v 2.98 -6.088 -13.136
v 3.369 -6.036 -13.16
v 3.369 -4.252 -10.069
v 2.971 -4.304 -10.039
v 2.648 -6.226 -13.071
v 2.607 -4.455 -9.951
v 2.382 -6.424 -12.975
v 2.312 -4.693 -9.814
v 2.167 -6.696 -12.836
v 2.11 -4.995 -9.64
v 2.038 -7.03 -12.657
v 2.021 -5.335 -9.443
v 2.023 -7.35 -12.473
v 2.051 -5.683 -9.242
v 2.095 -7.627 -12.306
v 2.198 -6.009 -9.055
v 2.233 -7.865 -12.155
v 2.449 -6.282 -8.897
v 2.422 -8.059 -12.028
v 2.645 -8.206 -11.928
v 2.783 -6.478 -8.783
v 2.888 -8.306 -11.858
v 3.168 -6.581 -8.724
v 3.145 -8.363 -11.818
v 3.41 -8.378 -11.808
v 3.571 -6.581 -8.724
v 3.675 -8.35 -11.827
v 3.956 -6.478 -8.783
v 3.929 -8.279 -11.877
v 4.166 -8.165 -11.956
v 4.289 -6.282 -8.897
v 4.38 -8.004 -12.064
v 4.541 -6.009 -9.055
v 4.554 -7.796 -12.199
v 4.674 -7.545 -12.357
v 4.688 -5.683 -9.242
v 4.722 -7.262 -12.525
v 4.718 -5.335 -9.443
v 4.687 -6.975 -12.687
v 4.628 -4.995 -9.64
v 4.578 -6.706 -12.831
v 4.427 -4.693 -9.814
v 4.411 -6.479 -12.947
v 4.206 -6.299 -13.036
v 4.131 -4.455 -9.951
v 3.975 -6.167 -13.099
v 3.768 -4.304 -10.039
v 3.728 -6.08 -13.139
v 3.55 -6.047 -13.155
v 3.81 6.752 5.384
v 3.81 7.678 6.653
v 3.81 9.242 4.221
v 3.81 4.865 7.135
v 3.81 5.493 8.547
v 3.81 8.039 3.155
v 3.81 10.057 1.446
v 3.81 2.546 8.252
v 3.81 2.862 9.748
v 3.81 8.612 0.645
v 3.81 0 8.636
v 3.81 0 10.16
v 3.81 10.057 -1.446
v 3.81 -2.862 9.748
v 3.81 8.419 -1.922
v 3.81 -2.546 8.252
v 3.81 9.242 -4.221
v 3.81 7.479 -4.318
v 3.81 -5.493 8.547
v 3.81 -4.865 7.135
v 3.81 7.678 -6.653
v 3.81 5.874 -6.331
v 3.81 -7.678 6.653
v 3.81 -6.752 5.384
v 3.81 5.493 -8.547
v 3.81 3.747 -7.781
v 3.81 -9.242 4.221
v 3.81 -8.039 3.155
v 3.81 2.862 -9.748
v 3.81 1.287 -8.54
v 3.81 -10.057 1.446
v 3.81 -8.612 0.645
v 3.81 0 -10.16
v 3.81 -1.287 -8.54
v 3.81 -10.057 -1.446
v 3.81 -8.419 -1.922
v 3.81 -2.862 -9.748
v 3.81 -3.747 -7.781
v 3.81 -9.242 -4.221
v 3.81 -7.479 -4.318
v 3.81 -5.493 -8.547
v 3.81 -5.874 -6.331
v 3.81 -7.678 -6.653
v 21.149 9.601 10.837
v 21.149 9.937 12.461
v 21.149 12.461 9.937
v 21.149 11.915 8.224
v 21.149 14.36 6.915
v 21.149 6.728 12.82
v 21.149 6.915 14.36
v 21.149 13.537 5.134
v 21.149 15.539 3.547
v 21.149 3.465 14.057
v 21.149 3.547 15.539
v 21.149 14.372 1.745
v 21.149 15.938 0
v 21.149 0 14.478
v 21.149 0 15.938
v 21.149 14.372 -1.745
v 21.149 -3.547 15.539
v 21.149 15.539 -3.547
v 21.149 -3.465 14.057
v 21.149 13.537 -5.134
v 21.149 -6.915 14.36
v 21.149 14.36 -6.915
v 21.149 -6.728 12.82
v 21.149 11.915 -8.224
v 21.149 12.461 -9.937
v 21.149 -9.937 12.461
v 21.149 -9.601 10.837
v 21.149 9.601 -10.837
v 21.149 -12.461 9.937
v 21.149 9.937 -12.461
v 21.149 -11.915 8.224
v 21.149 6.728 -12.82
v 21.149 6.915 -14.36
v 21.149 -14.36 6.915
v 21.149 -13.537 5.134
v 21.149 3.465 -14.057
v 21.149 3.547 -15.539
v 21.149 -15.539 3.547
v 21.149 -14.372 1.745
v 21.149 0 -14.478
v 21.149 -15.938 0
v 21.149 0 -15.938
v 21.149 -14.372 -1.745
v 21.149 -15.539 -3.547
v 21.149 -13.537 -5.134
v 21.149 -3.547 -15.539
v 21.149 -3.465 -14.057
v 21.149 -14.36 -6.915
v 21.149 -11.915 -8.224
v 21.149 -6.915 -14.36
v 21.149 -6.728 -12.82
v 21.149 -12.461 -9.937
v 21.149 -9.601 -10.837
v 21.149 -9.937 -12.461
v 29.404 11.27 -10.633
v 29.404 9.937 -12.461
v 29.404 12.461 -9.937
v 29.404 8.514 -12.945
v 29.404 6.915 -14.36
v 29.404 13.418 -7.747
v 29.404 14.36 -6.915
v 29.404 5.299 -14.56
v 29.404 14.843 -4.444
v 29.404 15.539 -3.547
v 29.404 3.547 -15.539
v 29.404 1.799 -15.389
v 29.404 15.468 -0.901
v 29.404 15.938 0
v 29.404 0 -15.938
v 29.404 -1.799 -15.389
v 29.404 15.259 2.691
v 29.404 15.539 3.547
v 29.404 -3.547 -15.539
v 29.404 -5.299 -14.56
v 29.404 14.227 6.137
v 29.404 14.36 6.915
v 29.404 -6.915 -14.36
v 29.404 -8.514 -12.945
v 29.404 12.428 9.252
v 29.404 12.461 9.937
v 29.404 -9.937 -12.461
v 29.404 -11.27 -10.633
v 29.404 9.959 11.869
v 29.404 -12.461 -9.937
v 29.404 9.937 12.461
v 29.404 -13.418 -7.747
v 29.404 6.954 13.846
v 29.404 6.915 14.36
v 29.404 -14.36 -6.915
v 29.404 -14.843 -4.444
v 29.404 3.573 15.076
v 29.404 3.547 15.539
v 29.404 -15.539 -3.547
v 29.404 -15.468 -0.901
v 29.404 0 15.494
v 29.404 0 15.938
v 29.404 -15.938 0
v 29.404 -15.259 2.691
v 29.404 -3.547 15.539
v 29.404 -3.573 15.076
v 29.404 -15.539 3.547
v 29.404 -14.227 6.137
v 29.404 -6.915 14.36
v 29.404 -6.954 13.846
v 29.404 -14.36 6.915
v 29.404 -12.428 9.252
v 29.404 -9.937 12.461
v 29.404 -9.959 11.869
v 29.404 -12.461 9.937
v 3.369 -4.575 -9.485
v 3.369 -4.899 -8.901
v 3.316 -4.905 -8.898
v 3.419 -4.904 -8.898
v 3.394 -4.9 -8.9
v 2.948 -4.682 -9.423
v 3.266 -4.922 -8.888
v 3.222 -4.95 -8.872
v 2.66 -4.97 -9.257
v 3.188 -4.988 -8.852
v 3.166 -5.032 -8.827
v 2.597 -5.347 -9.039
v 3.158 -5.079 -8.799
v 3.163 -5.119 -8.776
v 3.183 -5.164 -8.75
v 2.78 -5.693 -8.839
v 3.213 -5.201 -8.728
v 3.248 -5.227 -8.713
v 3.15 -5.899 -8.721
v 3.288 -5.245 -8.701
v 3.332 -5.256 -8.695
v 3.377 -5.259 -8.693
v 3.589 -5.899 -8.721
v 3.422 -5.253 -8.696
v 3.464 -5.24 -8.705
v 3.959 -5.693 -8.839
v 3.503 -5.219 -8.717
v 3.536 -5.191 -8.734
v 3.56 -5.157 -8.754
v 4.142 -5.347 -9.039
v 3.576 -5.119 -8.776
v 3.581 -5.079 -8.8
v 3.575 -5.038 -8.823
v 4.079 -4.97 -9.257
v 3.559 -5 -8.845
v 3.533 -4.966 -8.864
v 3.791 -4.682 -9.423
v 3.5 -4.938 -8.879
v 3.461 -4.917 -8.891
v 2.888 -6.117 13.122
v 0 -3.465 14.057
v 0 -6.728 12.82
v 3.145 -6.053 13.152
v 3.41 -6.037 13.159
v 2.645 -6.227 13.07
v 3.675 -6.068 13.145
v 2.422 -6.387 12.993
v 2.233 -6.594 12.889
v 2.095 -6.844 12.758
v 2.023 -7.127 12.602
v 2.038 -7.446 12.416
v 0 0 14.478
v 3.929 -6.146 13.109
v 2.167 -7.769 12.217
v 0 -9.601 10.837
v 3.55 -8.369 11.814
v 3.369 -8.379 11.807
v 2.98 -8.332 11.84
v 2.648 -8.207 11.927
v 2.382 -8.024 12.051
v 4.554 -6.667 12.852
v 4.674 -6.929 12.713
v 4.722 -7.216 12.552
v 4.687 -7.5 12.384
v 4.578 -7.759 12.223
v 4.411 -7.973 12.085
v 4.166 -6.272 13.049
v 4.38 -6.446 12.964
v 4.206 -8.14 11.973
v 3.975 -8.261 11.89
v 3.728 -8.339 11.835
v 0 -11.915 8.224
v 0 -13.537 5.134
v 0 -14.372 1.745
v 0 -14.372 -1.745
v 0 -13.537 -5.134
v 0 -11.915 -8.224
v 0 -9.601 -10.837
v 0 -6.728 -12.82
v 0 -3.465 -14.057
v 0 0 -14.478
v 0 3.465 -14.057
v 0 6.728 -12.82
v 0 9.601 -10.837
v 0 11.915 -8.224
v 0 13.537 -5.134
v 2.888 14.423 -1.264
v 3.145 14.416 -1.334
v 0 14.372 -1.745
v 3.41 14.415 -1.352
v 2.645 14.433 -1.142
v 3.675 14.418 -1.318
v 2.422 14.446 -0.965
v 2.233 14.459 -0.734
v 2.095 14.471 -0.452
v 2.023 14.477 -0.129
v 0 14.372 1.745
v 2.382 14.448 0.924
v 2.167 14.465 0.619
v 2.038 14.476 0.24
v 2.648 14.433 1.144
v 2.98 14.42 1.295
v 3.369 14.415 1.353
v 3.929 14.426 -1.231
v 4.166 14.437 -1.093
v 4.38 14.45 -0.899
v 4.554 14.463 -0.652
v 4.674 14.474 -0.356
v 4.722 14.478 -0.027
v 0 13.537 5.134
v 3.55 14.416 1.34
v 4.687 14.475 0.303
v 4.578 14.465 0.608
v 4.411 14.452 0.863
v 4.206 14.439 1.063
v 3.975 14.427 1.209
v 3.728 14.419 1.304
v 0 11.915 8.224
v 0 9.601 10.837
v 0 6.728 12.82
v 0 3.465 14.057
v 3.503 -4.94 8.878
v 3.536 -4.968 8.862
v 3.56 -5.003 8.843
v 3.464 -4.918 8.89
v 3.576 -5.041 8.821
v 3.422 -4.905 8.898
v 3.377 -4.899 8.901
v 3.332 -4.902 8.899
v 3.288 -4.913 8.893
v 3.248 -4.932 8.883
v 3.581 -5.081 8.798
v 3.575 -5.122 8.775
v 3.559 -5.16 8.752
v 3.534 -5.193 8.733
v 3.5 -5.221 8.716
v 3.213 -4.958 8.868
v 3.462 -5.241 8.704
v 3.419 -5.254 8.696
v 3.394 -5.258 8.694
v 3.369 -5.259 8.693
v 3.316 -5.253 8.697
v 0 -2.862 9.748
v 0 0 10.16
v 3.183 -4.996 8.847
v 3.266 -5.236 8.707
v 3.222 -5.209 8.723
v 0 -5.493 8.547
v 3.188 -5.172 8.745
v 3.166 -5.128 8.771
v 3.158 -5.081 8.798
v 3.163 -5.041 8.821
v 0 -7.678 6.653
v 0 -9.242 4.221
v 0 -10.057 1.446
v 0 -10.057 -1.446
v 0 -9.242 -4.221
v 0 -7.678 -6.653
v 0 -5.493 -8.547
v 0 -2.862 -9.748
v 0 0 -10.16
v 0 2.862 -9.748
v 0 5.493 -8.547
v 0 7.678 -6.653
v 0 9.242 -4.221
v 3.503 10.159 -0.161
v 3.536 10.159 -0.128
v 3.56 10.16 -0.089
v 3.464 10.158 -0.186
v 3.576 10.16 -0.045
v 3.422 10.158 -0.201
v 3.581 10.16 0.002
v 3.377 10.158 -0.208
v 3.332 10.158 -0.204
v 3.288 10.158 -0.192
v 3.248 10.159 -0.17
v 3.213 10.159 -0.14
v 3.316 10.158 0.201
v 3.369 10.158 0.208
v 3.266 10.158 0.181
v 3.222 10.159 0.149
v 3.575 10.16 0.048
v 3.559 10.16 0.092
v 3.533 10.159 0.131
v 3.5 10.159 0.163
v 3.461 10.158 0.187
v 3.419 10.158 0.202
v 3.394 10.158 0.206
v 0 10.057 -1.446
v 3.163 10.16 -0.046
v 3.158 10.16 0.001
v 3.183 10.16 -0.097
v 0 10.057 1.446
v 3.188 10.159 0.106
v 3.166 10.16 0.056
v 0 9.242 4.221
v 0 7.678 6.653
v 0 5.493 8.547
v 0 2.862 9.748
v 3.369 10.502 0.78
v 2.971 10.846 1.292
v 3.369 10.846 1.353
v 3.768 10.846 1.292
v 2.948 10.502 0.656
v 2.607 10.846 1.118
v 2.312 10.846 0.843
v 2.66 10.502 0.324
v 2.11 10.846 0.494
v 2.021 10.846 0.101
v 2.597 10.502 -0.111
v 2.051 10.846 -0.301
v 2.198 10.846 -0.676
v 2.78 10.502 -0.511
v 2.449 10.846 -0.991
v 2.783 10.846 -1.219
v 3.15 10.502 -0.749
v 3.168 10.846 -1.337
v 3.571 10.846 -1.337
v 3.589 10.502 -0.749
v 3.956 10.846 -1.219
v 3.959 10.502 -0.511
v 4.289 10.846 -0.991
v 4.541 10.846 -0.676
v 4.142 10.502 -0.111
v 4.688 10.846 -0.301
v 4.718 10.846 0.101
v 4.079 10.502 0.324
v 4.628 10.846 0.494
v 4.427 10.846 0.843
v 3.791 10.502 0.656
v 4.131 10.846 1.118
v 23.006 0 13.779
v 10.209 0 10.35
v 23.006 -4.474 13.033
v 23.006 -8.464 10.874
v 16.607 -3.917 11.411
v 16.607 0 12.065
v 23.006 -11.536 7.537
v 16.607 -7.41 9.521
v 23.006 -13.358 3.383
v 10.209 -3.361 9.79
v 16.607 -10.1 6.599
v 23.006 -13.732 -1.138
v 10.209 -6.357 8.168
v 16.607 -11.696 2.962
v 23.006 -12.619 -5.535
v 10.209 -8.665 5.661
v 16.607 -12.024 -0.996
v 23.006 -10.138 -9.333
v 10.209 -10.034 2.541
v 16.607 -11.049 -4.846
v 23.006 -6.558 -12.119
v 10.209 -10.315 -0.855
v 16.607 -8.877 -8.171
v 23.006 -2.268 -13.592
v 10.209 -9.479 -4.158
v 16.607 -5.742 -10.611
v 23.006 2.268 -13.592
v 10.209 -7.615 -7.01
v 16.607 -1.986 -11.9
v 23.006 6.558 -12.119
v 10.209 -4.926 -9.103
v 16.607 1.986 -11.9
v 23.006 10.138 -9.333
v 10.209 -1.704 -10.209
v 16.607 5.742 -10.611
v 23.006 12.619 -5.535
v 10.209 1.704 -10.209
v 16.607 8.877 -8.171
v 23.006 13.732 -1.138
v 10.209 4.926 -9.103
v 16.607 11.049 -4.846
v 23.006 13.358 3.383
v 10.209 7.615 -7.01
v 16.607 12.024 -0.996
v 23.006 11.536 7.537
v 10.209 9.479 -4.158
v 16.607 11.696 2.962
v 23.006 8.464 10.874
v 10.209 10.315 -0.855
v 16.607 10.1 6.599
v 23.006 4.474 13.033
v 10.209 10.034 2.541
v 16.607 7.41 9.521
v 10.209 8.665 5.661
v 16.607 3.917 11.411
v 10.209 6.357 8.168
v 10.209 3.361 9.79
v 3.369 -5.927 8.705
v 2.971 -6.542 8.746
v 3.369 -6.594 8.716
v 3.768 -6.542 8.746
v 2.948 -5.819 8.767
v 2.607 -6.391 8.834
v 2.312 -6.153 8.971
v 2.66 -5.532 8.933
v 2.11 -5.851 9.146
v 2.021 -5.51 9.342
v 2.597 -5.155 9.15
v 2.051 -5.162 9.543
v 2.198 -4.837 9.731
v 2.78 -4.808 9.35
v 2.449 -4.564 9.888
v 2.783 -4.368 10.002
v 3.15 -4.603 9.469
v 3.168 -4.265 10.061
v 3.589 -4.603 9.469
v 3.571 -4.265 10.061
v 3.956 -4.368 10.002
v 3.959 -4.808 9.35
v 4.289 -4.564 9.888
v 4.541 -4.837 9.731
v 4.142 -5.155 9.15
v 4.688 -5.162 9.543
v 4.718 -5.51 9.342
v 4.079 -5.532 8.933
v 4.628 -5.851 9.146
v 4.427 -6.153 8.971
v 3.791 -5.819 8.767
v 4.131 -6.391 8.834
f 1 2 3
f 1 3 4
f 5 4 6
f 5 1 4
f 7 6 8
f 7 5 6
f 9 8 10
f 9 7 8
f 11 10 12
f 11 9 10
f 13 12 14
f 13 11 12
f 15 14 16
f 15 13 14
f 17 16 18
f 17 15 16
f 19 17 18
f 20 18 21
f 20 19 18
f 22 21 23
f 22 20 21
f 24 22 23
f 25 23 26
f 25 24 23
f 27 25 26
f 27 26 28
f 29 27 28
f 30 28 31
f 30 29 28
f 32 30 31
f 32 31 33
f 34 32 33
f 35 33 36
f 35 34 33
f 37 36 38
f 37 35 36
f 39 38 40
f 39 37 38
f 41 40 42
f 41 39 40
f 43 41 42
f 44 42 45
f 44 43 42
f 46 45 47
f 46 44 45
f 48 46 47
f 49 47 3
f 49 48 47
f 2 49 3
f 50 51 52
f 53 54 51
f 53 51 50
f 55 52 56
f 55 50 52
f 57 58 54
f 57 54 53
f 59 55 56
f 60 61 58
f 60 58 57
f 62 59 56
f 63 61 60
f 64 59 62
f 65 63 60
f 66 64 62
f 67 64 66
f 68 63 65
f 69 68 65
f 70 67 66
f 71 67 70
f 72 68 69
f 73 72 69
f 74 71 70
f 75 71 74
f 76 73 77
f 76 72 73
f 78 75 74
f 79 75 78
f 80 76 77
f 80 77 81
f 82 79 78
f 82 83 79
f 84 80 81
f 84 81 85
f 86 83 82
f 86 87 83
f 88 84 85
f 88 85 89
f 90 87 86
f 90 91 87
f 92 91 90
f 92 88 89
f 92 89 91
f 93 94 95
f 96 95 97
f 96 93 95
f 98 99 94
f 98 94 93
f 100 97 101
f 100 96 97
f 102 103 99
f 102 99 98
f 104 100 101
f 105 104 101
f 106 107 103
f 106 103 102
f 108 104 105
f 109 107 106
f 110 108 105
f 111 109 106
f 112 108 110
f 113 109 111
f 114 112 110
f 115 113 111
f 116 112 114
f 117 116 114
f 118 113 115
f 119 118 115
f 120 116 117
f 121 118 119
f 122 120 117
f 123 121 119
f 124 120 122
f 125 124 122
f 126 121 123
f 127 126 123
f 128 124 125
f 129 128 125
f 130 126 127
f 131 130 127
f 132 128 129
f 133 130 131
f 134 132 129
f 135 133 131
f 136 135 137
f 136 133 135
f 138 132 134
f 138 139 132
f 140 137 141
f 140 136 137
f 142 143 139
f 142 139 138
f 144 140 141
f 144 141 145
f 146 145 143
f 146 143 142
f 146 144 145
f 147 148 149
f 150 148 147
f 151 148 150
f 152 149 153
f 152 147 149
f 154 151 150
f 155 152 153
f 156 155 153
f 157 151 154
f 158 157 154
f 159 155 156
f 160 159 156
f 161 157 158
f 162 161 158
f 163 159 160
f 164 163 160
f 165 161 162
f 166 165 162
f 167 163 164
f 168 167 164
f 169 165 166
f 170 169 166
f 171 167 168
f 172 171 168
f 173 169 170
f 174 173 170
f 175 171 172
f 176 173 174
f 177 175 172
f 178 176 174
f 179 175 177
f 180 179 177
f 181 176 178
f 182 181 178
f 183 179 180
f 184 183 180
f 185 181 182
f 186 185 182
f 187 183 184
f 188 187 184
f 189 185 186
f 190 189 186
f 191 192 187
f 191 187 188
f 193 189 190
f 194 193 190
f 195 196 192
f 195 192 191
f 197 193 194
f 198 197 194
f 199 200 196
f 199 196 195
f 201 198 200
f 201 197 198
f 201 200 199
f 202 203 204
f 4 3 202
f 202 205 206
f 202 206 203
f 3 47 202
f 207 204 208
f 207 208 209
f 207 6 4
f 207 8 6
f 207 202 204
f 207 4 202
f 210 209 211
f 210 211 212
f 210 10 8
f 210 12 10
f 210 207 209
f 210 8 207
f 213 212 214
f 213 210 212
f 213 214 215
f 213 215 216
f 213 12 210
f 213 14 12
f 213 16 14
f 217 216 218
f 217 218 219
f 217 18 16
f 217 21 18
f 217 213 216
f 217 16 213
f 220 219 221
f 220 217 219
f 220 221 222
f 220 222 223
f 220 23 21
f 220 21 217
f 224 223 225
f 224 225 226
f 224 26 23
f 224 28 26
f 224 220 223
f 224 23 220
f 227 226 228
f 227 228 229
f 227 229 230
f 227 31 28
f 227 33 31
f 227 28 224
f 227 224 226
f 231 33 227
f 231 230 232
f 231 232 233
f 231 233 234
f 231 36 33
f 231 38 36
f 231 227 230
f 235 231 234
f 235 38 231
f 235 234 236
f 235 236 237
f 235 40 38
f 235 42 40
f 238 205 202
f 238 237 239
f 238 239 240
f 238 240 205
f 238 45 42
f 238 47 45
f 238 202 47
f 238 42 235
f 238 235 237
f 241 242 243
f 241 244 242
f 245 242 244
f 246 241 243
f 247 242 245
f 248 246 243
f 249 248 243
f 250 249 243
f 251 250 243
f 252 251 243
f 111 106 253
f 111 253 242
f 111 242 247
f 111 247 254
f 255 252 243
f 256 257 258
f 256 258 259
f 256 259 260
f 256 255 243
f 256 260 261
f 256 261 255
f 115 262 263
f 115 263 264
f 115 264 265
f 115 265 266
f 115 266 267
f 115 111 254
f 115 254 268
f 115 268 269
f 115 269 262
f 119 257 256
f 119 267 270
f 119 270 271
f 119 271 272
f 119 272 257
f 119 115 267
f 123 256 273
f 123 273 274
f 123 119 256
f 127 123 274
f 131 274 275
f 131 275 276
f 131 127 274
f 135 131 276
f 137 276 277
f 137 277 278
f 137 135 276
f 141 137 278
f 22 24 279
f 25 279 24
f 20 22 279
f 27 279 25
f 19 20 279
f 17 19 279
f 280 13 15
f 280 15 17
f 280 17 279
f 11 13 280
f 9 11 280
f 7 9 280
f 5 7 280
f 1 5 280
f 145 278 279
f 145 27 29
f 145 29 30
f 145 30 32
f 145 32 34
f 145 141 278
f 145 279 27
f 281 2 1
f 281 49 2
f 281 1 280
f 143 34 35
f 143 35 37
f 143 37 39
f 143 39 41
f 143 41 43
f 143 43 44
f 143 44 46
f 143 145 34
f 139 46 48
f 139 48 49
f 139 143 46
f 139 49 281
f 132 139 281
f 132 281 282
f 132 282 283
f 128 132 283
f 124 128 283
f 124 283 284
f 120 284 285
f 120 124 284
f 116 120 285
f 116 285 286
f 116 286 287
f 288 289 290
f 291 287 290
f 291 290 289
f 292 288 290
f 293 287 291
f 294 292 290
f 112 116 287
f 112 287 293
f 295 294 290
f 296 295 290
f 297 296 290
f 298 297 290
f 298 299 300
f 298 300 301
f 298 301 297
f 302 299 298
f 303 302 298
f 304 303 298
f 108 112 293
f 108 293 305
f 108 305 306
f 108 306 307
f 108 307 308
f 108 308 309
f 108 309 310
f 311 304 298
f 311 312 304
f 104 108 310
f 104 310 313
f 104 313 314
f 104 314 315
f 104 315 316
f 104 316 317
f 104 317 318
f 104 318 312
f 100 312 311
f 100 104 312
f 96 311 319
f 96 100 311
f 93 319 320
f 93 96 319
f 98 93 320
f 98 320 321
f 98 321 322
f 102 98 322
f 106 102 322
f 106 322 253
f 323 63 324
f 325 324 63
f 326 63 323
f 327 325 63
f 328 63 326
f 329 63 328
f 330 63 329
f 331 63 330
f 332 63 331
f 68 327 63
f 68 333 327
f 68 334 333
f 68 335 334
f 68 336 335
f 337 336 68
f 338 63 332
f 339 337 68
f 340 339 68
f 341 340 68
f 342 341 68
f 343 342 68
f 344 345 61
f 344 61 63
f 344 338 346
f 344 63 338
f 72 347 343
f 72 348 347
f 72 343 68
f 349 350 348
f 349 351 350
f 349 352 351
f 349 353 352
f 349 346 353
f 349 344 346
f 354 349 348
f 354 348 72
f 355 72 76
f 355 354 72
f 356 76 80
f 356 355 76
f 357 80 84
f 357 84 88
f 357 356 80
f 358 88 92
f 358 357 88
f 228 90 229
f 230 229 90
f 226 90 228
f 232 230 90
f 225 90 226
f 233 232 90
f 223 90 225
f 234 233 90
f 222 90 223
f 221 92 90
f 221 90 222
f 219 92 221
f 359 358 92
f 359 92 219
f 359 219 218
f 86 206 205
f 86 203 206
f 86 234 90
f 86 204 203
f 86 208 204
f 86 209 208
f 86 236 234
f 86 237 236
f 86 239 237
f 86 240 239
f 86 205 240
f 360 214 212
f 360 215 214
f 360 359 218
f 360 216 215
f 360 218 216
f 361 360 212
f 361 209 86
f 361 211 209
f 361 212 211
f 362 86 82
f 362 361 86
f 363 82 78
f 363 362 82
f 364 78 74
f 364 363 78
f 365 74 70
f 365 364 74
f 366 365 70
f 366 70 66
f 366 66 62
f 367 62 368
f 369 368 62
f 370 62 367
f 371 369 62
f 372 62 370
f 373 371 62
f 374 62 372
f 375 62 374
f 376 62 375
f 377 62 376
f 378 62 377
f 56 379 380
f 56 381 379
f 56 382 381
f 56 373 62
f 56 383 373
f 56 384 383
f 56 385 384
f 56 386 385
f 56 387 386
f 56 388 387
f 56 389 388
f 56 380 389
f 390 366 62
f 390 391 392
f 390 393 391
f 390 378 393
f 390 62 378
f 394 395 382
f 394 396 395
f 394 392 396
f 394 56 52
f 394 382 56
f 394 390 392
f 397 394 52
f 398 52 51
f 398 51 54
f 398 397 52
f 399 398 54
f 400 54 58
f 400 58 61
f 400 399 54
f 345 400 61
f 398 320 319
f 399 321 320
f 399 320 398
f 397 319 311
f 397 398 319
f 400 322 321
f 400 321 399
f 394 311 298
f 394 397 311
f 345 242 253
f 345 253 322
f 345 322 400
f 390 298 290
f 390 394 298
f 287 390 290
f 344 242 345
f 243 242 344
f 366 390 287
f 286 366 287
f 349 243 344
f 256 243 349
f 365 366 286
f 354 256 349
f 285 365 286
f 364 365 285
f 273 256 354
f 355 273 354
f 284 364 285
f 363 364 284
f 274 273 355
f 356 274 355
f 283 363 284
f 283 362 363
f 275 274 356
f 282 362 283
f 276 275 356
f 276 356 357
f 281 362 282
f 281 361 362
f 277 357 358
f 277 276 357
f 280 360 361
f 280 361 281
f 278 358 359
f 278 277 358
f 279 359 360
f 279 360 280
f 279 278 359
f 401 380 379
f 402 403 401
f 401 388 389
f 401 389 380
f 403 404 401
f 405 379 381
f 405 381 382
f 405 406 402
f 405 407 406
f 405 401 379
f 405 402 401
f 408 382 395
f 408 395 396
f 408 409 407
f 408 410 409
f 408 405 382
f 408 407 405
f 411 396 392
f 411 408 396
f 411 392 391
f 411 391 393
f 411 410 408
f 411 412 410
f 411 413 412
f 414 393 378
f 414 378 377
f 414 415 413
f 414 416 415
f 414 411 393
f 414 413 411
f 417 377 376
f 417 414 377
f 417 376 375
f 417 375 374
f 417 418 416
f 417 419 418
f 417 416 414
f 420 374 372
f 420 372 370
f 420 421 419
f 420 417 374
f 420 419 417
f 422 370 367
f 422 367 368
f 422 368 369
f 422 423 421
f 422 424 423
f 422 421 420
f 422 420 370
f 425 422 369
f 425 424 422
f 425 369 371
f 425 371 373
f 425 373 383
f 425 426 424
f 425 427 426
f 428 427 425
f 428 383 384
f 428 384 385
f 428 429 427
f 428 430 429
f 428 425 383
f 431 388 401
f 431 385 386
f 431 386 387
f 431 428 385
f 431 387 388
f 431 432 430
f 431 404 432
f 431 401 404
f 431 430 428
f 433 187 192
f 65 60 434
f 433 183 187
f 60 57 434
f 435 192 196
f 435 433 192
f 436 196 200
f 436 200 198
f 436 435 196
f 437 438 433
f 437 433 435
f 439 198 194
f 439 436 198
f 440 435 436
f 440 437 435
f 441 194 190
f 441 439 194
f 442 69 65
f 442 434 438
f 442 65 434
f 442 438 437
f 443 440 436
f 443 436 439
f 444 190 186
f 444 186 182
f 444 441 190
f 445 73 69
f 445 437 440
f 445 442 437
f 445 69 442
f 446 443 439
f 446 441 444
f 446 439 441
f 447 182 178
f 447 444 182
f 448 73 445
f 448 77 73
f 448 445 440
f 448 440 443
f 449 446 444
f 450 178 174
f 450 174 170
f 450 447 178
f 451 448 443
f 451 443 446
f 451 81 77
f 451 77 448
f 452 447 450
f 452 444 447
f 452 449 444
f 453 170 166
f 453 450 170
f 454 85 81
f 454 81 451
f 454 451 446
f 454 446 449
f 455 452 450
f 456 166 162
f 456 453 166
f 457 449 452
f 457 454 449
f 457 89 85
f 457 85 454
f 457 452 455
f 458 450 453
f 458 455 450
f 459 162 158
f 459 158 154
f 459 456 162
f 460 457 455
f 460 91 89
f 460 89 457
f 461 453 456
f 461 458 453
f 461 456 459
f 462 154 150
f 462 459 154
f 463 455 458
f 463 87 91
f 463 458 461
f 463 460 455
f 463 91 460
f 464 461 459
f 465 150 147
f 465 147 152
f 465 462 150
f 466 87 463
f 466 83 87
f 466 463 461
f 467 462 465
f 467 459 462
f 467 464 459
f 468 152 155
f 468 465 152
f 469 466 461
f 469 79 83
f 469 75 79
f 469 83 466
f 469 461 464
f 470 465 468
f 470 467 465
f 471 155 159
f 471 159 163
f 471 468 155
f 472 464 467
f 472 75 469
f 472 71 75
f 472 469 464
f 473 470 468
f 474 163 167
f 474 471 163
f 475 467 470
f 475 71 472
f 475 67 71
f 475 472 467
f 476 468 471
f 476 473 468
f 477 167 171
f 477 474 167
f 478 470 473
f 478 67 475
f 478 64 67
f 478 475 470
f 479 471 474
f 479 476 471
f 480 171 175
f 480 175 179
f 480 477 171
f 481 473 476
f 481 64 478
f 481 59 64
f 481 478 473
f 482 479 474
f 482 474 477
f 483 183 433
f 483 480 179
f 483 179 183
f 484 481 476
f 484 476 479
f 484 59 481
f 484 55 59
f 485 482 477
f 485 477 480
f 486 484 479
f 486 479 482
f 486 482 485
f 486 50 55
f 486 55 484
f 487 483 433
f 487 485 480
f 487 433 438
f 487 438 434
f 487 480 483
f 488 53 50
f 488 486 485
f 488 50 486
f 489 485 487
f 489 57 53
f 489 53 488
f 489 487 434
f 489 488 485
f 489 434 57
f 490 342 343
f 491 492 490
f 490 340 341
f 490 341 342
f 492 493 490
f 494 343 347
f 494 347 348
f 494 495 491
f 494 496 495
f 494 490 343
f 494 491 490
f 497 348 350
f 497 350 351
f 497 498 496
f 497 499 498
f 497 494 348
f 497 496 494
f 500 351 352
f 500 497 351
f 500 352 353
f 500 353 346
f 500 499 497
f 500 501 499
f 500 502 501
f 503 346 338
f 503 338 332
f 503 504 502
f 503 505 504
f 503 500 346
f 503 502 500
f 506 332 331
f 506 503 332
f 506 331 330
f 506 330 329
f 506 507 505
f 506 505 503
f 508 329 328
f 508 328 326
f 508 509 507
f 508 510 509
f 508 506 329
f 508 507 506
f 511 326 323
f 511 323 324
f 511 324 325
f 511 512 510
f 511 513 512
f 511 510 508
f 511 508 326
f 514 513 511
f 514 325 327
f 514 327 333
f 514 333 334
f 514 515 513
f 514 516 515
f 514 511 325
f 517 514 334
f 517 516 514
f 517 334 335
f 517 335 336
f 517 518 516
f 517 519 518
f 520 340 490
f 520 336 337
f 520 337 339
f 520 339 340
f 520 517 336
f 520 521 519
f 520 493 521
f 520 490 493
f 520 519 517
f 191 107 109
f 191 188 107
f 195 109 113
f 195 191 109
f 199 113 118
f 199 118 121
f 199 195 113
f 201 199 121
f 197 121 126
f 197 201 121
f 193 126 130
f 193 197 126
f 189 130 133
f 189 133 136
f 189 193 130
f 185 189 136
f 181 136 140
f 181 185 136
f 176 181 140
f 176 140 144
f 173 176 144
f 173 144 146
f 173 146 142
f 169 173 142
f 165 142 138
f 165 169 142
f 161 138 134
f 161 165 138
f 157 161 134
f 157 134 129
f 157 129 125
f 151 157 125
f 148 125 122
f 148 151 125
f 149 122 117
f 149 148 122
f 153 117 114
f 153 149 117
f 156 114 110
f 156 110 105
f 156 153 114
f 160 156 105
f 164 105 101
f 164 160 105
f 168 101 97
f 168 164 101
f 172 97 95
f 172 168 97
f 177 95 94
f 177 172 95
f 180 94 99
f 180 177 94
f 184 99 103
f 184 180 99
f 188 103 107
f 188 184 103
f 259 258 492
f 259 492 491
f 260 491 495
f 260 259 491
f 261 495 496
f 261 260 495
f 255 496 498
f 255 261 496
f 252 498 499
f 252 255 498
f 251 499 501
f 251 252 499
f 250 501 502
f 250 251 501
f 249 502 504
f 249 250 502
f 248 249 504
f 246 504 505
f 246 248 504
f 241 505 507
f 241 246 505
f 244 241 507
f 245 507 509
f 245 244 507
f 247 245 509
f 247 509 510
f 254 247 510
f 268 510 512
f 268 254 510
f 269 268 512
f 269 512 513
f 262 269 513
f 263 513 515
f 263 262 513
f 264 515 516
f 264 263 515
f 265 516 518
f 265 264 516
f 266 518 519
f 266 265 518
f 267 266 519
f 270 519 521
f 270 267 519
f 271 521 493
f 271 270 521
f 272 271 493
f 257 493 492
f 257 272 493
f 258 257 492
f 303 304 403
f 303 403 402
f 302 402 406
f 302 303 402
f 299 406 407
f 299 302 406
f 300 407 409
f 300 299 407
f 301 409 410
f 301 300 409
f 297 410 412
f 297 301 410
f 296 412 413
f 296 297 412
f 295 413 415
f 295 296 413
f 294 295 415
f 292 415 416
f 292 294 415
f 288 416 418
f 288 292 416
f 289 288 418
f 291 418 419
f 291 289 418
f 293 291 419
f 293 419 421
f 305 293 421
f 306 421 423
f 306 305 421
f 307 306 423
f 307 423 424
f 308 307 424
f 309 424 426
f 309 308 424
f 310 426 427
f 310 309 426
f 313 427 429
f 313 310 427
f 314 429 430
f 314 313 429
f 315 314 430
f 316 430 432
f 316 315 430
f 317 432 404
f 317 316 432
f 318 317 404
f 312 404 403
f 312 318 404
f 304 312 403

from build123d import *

# Parameters (mm, degrees)
CIRPATTERN1_COUNT = 3


with BuildPart() as part:
    # Sketch1 → Revolve1 (revolve)
    with BuildSketch(Plane.XY, mode=Mode.PRIVATE) as revolve1_sk:
        Polygon((0, 14.478), (21.149404438, 14.478), (21.149404438, 15.9385), (29.404404438, 15.9385), (29.404404438, 15.494), (3.81, 8.636), (3.81, 10.16), (0, 10.16), align=None)
    revolve(revolve1_sk.sketch.rotate(Axis((0, 0, 0), (1, 0, 0)), 90), axis=Axis((0, 0, 0), (1, 0, 0)))

    # Sketch3 → #6-32 Tapped Hole1 (revolve, cut)
    with BuildSketch(Plane(origin=(3.369404438, 14.478, 0), x_dir=(0, 0, 1), z_dir=(1, 0, 0))):
        Polygon((0, 0), (0, 4.445), (1.35255, 3.63230597), (1.35255, 0), align=None)
    f_6_32_tapped_hole1 = revolve(axis=Axis((3.369404438, 20.828, 0), (0, -1, 0)), mode=Mode.SUBTRACT)

    # CirPattern1: #6-32 Tapped Hole1 ×3 about axis
    cirpattern1_axis = Axis((0, 0, 0), (-1, 0, 0))
    for i in range(1, CIRPATTERN1_COUNT):
        add(f_6_32_tapped_hole1.rotate(cirpattern1_axis, i * 360 / CIRPATTERN1_COUNT), mode=Mode.SUBTRACT)


solid = part.part
